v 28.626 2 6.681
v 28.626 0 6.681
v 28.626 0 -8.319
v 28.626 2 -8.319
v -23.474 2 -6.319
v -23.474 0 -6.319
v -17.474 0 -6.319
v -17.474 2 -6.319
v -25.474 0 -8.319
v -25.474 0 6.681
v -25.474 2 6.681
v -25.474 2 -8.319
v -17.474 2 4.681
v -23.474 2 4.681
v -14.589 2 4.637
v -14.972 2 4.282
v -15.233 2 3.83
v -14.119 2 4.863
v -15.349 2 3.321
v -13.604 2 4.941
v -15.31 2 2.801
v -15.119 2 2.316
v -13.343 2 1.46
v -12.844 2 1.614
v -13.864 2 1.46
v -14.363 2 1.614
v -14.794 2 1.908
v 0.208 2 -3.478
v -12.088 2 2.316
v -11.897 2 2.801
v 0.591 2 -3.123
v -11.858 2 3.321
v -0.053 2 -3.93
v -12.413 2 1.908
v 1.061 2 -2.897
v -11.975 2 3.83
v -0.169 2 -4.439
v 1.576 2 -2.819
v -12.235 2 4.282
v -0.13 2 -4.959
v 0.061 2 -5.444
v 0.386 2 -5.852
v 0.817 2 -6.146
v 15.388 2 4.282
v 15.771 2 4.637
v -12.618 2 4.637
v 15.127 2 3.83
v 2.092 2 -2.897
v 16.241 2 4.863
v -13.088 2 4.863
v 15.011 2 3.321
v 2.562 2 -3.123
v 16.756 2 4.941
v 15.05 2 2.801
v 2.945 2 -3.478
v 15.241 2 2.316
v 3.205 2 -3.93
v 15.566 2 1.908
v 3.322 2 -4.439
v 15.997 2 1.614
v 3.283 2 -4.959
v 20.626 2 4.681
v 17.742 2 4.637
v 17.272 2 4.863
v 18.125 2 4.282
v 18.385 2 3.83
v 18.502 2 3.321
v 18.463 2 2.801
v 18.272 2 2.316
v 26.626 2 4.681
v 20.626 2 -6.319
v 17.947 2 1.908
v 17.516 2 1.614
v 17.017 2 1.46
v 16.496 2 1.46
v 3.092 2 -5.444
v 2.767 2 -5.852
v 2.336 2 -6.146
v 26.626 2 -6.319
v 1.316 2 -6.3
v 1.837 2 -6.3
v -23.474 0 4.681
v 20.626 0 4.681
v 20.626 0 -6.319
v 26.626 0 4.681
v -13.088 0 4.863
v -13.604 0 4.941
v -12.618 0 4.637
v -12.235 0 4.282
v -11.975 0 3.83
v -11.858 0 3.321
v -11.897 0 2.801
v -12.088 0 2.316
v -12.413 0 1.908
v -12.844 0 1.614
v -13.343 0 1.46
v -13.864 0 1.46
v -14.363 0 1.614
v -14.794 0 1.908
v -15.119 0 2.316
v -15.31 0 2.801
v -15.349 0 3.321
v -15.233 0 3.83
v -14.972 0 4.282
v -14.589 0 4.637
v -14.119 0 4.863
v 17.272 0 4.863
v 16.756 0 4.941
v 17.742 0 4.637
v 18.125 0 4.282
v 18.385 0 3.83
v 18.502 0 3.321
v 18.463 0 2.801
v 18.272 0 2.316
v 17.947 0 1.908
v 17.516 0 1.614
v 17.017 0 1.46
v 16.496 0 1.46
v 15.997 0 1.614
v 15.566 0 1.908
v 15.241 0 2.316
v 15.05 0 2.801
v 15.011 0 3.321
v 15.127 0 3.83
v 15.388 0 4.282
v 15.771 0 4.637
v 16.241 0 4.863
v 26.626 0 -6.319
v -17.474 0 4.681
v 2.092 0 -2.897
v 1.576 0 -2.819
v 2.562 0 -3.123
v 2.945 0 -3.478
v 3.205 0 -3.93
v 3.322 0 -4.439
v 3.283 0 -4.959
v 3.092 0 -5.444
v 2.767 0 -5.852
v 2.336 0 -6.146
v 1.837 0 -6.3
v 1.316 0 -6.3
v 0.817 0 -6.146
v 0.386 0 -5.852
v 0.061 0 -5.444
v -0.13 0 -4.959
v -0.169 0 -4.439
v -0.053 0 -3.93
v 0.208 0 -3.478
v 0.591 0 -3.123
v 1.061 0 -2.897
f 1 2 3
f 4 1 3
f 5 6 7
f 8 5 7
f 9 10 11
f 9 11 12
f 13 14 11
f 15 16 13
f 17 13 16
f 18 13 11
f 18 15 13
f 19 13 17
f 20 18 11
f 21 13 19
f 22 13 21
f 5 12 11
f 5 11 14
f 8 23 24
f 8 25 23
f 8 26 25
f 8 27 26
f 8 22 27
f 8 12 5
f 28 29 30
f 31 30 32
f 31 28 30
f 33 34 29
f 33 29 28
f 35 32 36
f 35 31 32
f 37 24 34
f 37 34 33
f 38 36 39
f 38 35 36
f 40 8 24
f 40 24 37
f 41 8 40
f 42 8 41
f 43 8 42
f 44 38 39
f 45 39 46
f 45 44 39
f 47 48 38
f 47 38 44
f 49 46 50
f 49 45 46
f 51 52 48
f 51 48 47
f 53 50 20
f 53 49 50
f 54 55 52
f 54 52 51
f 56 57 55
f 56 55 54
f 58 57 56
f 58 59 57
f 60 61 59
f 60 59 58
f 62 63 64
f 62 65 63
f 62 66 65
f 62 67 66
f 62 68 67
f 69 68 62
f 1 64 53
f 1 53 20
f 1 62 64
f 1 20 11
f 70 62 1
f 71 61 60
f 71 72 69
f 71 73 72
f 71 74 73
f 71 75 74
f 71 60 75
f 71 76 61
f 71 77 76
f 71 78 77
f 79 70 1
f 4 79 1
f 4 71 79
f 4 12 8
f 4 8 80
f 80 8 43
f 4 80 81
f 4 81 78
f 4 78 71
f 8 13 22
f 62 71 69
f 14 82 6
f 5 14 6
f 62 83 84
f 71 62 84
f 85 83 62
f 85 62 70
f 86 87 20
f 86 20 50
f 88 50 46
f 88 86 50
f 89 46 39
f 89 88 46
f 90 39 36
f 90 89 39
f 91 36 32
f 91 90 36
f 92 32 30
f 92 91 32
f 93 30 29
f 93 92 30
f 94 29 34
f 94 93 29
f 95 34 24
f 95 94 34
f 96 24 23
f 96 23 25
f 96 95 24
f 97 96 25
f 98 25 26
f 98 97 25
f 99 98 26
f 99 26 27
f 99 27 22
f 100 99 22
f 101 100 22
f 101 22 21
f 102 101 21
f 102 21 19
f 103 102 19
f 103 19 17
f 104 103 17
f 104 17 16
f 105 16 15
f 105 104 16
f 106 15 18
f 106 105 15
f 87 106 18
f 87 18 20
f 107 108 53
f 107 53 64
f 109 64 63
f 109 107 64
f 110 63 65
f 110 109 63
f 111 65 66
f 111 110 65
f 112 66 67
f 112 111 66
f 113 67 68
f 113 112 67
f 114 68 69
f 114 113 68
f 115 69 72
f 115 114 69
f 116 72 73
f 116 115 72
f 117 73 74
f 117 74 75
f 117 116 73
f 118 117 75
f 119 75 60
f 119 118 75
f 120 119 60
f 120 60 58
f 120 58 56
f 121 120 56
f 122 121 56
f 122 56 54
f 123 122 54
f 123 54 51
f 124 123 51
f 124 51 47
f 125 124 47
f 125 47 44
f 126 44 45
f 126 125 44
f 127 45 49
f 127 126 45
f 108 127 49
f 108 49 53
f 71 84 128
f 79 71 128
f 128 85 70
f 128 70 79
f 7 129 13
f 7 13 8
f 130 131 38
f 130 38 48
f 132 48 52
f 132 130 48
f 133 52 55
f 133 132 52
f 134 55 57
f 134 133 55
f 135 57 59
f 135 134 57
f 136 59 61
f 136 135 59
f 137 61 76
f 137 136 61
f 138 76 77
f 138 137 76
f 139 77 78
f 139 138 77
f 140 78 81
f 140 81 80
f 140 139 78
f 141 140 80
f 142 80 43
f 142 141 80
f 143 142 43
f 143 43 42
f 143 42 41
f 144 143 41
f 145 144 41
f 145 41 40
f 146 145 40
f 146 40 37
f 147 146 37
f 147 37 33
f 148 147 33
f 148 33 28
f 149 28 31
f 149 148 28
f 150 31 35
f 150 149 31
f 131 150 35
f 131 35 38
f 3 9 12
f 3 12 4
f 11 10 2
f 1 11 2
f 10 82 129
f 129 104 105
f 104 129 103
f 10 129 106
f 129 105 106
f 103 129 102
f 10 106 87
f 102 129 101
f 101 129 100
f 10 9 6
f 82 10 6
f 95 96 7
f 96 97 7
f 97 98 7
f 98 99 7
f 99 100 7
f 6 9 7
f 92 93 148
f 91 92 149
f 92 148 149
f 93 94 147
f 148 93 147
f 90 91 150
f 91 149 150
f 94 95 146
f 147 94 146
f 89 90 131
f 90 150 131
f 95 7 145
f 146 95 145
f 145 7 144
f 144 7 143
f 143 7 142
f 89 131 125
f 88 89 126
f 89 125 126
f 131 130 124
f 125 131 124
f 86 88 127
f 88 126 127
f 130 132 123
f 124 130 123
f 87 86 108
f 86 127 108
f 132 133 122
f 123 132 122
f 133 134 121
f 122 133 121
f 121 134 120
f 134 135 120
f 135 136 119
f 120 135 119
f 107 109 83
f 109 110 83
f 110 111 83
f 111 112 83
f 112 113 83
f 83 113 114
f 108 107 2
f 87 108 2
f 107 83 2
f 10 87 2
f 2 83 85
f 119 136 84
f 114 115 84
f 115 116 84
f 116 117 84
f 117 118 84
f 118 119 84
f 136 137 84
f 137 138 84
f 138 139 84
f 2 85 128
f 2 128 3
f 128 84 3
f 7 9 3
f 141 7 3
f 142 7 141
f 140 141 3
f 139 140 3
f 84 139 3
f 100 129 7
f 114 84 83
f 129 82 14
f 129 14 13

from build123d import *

# Parameters (mm, degrees)
SKETCH1_W           = 54.1
SKETCH1_H           = 15
SKETCH1_R           = 1.75
SKETCH1_W_2         = 6
SKETCH1_H_2         = 11
BOSS_EXTRUDE1_DEPTH = 2


with BuildPart() as part:
    # Sketch1 → Boss-Extrude1 (new body)
    with BuildSketch(Plane(origin=(0, 0, 0), x_dir=(1, 0, 0), z_dir=(0, 1, 0))):
        with Locations((1.576423546, 0.819405027)):
            Rectangle(SKETCH1_W, SKETCH1_H)
        with Locations(Location((16.756423546, -3.190594973, 0), (0, 0, 270))):
            Circle(SKETCH1_R, mode=Mode.SUBTRACT)
        with Locations(Location((-13.603576454, -3.190594973, 0), (0, 0, 270))):
            Circle(SKETCH1_R, mode=Mode.SUBTRACT)
        with Locations(Location((1.576423546, 4.569405027, 0), (0, 0, 270))):
            Circle(SKETCH1_R, mode=Mode.SUBTRACT)
        with Locations((-20.473576454, 0.819405027)):
            Rectangle(SKETCH1_W_2, SKETCH1_H_2, mode=Mode.SUBTRACT)
        with Locations((23.626423546, 0.819405027)):
            Rectangle(SKETCH1_W_2, SKETCH1_H_2, mode=Mode.SUBTRACT)
    extrude(amount=BOSS_EXTRUDE1_DEPTH)


solid = part.part
